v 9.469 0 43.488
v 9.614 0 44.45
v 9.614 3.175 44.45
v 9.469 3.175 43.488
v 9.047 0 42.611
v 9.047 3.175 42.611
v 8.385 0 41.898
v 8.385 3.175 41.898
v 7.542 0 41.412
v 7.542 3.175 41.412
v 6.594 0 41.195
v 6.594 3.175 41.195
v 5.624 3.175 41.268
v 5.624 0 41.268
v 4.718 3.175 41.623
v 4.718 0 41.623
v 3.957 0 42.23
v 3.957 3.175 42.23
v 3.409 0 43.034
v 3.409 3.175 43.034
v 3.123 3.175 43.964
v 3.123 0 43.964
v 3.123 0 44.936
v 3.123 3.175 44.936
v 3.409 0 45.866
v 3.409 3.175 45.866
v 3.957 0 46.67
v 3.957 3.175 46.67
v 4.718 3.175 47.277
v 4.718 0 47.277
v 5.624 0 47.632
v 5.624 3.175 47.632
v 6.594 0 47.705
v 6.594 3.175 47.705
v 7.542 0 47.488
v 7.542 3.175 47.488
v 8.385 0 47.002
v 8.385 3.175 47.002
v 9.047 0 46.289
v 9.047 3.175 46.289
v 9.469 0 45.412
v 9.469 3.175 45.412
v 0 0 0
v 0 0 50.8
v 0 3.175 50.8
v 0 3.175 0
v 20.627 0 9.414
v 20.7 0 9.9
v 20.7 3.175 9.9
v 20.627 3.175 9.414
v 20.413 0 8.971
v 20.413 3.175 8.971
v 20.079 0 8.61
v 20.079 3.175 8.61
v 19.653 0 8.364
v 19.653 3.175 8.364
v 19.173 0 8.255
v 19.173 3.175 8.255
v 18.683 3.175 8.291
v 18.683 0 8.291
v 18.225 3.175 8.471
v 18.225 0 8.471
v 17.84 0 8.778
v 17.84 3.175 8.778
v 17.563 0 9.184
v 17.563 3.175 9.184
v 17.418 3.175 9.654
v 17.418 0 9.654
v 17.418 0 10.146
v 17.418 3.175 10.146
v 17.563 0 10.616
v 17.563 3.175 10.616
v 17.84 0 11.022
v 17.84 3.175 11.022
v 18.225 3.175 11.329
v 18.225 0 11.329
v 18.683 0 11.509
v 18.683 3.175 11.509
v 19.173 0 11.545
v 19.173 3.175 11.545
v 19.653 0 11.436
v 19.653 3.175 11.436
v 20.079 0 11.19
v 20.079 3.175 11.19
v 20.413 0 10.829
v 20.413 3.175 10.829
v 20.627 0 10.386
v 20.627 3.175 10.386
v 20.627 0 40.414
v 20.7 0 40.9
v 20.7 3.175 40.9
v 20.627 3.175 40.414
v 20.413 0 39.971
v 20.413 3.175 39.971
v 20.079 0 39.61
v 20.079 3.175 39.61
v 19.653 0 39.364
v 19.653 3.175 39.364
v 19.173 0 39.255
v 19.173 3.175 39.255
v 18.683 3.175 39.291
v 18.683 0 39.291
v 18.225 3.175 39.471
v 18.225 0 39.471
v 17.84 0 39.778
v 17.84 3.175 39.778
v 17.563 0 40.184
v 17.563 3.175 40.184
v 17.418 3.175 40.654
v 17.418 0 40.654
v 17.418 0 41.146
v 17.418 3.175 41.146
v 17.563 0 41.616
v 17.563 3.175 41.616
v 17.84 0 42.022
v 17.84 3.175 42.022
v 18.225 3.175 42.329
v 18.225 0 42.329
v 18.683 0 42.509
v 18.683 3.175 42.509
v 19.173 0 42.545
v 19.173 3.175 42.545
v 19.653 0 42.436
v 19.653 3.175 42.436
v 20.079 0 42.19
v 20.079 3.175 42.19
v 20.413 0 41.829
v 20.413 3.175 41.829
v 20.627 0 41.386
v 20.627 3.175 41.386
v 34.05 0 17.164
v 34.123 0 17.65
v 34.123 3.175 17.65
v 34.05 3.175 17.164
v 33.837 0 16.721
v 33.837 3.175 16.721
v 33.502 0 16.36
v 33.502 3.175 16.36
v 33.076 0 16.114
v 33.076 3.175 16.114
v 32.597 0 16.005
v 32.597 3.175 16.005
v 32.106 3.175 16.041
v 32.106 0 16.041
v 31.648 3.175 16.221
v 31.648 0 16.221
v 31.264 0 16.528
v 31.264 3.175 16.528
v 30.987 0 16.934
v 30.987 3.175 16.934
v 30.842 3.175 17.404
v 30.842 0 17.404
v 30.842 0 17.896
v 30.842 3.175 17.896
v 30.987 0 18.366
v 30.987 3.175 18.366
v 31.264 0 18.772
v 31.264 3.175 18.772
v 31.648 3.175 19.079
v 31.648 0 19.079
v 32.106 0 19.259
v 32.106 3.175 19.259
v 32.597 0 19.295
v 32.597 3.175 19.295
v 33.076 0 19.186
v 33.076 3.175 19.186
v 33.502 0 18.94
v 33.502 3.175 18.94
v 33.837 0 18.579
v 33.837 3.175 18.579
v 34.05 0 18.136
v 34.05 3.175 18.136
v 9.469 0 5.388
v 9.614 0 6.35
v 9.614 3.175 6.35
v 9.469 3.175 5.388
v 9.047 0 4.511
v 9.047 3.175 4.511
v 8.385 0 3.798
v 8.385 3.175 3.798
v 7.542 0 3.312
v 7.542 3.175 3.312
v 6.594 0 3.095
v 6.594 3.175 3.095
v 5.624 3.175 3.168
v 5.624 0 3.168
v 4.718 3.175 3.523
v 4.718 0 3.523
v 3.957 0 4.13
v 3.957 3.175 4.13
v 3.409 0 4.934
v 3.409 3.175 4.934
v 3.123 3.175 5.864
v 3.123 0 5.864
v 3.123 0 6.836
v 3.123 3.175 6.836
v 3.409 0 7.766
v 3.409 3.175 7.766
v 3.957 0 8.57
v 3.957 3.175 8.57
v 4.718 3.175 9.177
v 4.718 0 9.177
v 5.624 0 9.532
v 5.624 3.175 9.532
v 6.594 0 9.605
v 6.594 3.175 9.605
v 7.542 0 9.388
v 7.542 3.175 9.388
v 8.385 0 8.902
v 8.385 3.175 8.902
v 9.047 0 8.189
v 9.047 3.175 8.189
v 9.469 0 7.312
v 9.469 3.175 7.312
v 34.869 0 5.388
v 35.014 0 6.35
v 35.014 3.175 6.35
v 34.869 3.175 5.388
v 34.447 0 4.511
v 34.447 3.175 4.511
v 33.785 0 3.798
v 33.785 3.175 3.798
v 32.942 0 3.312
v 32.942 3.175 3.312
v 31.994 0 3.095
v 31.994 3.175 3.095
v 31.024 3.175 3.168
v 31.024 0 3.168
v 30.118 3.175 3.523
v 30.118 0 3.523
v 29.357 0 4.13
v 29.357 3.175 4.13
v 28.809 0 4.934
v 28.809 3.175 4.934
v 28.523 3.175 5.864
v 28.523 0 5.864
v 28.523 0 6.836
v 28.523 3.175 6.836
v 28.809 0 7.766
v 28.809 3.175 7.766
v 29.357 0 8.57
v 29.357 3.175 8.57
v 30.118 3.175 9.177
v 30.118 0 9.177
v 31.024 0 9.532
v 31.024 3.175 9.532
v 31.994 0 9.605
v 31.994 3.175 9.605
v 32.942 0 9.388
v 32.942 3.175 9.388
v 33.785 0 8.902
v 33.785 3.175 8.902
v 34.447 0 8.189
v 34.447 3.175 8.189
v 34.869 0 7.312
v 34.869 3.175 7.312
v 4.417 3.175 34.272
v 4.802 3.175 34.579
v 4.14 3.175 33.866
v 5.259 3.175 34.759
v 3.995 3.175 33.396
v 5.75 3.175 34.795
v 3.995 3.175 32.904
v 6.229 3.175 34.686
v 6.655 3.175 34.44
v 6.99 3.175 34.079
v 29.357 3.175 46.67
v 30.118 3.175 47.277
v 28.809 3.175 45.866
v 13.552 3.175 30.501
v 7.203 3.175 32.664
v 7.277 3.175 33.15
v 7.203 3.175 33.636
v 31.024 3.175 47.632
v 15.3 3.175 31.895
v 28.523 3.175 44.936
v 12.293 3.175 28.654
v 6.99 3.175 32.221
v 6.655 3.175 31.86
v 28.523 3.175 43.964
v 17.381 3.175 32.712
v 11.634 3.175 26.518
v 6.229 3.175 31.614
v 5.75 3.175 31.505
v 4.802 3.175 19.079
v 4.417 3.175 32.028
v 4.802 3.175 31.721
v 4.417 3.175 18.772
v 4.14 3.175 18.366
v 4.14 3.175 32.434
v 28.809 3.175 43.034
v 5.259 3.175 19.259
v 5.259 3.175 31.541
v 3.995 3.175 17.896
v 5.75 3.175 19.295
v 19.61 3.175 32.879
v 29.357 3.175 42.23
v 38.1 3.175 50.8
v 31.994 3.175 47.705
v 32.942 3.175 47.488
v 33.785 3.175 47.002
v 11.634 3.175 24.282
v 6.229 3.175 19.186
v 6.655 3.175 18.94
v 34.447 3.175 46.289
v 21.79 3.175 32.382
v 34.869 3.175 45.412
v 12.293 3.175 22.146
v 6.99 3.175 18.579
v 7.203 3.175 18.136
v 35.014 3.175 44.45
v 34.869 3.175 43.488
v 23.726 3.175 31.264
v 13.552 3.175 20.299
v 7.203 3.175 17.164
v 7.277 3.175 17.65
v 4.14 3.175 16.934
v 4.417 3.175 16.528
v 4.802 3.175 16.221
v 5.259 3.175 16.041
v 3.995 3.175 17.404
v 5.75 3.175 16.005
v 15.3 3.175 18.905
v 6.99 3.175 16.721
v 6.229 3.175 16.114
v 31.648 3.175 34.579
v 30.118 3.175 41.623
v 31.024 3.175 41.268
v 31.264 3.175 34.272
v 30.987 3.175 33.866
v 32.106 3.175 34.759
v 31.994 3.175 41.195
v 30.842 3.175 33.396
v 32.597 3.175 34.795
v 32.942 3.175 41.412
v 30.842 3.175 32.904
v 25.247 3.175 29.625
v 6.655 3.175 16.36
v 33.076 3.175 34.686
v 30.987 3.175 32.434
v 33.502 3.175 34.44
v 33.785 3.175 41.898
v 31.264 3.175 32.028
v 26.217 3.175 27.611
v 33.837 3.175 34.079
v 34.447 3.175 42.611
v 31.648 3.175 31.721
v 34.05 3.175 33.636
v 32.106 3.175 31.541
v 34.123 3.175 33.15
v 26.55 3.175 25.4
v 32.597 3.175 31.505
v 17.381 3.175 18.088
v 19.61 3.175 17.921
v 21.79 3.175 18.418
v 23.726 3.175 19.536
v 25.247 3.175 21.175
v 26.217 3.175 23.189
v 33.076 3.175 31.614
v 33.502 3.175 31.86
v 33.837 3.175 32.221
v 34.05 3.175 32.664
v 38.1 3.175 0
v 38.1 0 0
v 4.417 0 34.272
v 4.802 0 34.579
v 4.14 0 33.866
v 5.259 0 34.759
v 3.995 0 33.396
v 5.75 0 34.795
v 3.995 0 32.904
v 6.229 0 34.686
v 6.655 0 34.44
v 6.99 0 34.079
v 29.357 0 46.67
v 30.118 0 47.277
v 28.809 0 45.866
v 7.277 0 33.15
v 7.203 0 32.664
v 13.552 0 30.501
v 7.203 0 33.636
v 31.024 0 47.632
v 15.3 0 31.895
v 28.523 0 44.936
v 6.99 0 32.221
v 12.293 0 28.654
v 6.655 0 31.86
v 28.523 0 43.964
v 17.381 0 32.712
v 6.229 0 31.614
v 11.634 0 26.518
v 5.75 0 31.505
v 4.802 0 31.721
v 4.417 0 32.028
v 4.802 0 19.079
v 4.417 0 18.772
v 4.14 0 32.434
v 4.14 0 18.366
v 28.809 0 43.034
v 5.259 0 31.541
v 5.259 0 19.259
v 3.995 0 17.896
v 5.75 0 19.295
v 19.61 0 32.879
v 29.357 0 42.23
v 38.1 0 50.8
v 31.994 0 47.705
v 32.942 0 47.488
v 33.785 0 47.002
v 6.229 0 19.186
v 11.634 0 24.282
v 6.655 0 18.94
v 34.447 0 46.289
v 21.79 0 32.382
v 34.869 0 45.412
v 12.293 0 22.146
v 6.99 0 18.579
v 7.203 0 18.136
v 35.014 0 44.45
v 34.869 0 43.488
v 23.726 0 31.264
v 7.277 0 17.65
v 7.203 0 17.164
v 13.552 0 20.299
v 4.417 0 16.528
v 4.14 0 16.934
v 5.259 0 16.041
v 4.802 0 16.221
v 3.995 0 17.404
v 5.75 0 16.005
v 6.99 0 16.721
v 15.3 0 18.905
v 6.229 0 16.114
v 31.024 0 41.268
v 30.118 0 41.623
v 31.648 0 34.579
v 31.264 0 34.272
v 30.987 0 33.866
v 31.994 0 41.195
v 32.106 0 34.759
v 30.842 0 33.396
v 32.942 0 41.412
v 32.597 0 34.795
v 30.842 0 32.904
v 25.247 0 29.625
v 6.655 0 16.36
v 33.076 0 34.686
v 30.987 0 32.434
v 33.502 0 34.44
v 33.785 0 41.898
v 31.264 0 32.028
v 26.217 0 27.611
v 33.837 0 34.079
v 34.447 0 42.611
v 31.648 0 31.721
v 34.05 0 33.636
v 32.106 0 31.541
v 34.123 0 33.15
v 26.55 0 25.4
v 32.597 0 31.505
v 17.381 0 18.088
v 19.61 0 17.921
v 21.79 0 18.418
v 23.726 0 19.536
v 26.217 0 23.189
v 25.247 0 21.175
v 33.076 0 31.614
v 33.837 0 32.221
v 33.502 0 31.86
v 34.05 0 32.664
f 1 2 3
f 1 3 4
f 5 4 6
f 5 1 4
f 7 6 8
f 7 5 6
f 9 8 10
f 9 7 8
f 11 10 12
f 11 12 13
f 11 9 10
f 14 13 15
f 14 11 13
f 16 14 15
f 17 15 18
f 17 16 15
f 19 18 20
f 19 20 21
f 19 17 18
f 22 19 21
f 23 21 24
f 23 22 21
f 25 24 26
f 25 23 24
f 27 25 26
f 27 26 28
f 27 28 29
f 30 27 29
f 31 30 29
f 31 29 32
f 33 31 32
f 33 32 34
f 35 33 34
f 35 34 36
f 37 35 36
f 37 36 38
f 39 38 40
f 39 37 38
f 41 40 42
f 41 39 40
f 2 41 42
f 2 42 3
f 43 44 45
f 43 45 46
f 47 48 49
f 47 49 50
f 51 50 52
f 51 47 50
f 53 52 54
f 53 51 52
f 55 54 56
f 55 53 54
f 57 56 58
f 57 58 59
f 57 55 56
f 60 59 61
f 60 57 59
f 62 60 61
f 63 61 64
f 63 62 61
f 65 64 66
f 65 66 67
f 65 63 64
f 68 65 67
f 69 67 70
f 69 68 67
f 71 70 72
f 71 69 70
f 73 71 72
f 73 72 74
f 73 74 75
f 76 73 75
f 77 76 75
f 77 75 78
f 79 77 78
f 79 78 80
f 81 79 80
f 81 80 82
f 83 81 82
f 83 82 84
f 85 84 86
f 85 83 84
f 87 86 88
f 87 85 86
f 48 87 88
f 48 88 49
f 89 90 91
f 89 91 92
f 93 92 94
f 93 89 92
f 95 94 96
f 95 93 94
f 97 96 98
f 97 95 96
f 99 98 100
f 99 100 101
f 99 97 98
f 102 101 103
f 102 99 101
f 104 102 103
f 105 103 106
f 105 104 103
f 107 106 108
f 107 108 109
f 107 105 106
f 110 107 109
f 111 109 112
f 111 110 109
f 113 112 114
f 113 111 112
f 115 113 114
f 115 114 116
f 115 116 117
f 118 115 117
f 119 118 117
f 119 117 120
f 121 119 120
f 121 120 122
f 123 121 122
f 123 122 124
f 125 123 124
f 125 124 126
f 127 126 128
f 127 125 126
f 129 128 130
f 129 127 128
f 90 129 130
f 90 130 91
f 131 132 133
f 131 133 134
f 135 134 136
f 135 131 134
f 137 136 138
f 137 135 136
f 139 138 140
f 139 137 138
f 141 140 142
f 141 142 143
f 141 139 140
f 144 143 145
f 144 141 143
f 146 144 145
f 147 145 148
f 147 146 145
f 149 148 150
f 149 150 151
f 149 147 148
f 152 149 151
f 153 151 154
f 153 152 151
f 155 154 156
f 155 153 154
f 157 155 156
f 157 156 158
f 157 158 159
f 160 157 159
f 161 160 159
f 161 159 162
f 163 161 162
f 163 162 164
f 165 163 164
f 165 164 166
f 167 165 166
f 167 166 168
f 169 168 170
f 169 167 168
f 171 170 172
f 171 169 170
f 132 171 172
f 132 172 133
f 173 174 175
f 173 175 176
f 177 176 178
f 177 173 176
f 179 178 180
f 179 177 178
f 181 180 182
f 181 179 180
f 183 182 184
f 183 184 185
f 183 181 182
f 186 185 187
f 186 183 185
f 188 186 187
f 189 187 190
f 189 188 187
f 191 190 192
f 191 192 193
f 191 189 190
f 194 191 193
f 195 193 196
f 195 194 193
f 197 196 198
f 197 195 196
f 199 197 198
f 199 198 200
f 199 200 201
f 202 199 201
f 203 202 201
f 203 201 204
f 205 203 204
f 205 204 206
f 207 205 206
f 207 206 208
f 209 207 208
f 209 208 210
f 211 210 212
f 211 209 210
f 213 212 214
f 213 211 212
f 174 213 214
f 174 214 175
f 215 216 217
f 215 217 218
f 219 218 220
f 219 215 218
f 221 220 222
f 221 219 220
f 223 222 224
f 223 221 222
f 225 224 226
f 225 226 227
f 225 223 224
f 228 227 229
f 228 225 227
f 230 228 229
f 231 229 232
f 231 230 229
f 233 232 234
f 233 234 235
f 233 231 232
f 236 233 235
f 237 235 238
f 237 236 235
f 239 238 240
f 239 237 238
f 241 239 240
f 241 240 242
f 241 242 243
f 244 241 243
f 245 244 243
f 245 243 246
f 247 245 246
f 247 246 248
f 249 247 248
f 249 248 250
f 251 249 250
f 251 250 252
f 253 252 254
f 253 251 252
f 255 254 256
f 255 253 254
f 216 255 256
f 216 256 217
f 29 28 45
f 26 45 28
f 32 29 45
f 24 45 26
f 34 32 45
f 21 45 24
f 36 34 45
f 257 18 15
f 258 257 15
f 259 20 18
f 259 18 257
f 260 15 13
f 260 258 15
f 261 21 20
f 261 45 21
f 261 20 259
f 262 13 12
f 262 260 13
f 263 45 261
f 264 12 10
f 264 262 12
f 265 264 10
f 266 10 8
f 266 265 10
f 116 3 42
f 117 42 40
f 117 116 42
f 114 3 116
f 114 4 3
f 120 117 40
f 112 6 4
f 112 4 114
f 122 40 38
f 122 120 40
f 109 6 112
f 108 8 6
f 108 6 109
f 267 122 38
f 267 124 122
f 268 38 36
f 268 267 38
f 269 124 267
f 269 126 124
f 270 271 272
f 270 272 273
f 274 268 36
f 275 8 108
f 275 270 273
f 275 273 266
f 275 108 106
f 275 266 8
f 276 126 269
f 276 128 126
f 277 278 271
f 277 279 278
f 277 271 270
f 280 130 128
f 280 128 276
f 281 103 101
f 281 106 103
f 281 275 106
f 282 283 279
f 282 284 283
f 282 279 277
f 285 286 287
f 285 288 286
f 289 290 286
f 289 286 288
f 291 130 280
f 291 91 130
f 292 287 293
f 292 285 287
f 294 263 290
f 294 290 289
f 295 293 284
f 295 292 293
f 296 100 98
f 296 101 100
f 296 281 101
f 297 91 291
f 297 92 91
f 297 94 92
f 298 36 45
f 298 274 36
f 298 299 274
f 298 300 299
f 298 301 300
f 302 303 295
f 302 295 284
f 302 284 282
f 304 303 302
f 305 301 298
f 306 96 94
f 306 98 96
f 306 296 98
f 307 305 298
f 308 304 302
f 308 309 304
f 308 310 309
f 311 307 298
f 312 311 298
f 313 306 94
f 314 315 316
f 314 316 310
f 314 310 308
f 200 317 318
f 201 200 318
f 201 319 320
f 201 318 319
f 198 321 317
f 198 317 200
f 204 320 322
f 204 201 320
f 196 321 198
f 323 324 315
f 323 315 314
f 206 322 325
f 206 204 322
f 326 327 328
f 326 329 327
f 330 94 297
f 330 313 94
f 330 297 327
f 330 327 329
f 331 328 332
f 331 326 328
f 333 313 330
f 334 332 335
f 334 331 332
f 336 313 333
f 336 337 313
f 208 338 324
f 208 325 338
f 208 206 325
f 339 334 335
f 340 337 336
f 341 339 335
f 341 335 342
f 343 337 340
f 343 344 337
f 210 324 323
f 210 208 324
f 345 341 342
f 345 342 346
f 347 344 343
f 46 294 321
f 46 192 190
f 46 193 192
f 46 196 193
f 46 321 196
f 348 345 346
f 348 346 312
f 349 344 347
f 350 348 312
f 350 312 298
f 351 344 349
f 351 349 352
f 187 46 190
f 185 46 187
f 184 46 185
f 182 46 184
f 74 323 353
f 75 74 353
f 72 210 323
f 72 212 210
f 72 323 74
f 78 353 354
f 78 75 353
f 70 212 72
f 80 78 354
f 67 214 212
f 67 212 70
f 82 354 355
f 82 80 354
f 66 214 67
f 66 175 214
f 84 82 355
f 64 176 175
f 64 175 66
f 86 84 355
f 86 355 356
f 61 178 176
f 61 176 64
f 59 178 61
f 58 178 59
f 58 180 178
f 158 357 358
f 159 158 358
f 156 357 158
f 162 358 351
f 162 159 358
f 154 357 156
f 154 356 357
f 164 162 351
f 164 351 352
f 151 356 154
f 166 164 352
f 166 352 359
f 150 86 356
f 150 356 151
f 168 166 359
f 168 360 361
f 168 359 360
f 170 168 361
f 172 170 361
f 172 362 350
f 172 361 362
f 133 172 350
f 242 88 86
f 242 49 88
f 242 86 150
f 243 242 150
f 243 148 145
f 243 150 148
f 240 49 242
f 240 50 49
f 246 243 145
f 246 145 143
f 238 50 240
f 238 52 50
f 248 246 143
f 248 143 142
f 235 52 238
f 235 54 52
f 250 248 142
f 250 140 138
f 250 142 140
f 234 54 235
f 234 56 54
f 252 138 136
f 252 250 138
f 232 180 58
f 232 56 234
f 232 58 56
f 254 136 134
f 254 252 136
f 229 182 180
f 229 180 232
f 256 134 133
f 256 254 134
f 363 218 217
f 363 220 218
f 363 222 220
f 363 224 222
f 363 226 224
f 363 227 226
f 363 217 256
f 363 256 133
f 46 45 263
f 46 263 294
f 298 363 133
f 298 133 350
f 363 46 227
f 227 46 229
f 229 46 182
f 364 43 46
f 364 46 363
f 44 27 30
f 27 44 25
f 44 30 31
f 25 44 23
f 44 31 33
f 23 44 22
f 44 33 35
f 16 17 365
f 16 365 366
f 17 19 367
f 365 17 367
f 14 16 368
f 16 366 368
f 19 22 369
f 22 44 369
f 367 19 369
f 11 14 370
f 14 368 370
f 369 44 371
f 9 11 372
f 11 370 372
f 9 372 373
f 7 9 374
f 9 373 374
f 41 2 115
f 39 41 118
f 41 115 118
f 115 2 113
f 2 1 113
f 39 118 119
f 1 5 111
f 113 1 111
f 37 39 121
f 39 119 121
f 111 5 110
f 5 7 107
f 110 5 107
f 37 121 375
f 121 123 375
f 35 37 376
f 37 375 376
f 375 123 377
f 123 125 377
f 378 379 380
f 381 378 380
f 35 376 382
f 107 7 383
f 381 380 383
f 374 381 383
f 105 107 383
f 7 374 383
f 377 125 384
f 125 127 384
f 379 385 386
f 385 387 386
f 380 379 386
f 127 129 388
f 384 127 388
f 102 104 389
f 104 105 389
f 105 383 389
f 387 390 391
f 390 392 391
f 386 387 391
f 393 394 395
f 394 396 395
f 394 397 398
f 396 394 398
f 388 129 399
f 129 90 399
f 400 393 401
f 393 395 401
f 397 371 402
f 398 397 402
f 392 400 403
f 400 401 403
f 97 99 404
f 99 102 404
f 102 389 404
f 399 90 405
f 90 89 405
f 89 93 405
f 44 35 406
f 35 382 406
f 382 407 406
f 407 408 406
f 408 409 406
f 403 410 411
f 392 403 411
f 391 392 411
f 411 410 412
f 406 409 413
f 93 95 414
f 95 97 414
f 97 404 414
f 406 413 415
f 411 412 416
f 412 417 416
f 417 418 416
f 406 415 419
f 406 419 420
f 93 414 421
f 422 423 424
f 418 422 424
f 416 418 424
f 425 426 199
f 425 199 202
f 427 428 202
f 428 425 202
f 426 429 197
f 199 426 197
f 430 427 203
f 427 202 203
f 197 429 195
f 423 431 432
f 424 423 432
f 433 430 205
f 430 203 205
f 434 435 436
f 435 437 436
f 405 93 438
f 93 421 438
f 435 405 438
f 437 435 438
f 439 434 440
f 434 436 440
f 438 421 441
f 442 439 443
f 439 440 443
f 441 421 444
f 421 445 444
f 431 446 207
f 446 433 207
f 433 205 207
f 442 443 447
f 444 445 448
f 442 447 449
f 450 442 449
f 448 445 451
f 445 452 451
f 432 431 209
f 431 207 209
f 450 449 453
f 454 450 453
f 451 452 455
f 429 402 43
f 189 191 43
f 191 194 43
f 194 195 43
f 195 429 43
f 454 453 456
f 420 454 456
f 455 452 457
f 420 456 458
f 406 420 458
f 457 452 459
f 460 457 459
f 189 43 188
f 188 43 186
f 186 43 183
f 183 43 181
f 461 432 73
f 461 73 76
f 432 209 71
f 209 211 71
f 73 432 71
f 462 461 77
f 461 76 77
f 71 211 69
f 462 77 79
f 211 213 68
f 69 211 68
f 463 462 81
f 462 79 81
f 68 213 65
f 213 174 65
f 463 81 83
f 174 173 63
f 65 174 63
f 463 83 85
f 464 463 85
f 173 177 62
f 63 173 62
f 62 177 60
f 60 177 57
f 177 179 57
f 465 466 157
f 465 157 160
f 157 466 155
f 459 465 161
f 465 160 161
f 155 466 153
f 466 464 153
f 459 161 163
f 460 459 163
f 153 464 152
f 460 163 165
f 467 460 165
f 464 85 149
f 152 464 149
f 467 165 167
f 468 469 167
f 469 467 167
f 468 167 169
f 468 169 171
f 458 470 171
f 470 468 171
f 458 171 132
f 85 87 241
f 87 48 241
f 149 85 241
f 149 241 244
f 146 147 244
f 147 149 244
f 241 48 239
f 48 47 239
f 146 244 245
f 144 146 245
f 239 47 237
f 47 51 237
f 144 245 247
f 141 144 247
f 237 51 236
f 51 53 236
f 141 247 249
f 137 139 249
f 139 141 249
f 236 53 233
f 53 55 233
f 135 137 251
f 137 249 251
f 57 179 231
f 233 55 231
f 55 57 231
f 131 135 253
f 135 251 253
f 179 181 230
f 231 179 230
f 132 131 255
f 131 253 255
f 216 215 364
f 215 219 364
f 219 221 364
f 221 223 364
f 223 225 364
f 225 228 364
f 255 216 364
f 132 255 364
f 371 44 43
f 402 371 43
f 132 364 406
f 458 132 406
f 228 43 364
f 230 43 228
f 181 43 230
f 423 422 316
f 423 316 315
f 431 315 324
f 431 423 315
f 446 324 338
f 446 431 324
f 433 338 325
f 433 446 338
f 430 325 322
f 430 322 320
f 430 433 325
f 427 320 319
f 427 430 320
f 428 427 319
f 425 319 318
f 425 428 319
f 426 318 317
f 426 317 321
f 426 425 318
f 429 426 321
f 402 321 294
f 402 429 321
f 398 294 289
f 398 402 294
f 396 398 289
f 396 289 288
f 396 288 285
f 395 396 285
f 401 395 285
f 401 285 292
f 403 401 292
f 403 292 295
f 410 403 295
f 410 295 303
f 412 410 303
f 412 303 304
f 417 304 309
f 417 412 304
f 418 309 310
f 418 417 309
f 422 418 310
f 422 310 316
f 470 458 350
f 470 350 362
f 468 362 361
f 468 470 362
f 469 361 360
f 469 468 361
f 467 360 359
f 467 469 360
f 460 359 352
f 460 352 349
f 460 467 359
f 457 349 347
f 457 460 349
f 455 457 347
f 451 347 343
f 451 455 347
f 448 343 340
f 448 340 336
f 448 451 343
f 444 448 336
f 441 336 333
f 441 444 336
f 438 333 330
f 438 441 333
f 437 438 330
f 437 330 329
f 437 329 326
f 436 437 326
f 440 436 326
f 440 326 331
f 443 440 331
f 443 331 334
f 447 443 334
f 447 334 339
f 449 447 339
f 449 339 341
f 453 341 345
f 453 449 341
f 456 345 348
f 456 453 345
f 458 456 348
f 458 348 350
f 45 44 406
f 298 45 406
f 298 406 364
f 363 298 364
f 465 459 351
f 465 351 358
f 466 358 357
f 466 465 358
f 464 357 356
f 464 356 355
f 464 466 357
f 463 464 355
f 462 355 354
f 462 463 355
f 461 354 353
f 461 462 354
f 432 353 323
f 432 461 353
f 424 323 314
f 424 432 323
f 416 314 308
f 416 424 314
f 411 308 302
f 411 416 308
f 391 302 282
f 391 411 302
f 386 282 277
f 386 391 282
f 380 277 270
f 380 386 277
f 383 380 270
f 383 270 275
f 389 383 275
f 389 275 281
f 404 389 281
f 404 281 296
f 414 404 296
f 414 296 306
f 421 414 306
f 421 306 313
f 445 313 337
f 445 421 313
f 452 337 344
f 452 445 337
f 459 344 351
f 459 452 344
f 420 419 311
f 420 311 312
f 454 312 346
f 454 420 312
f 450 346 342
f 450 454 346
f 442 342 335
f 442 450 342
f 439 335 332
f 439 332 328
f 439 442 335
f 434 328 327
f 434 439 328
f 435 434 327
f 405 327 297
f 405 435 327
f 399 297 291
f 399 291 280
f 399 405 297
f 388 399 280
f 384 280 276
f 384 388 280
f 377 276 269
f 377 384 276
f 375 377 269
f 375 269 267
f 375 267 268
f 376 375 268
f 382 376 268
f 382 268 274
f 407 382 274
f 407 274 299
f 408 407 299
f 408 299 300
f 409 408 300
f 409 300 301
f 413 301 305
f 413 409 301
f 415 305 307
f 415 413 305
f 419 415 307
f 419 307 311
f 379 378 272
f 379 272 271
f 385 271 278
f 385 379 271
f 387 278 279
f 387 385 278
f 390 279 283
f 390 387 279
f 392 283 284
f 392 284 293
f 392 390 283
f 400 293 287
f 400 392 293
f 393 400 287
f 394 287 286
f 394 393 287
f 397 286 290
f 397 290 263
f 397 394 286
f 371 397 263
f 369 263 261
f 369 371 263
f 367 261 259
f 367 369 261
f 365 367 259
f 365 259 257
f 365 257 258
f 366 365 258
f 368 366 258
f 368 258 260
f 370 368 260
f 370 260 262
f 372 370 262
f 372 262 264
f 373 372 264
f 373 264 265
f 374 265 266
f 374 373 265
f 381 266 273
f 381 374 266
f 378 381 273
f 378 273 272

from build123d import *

# Parameters (mm, degrees)
SKETCH1_W          = 38.1
SKETCH1_H          = 50.8
SKETCH1_R          = 1.65
SKETCH1_R_2        = 7.5
SKETCH1_R_3        = 3.2639
BASE_EXTRUDE_DEPTH = 3.175


with BuildPart() as part:
    # Sketch1 → Base Extrude (new body)
    with BuildSketch(Plane(origin=(0, 0, 0), x_dir=(1, 0, 0), z_dir=(0, 1, 0))):
        with Locations((19.05, -25.4)):
            Rectangle(SKETCH1_W, SKETCH1_H)
        with Locations((19.05, -40.9)):
            Circle(SKETCH1_R, mode=Mode.SUBTRACT)
        with Locations((5.626606241, -33.15)):
            Circle(SKETCH1_R, mode=Mode.SUBTRACT)
        with Locations((5.626606241, -17.65)):
            Circle(SKETCH1_R, mode=Mode.SUBTRACT)
        with Locations((19.05, -9.9)):
            Circle(SKETCH1_R, mode=Mode.SUBTRACT)
        with Locations((32.473393759, -17.65)):
            Circle(SKETCH1_R, mode=Mode.SUBTRACT)
        with Locations((32.473393759, -33.15)):
            Circle(SKETCH1_R, mode=Mode.SUBTRACT)
        with Locations((19.05, -25.4)):
            Circle(SKETCH1_R_2, mode=Mode.SUBTRACT)
        with Locations((6.35, -6.35)):
            Circle(SKETCH1_R_3, mode=Mode.SUBTRACT)
        with Locations((31.75, -6.35)):
            Circle(SKETCH1_R_3, mode=Mode.SUBTRACT)
        with Locations((6.35, -44.45)):
            Circle(SKETCH1_R_3, mode=Mode.SUBTRACT)
        with Locations((31.75, -44.45)):
            Circle(SKETCH1_R_3, mode=Mode.SUBTRACT)
    extrude(amount=BASE_EXTRUDE_DEPTH)


solid = part.part
